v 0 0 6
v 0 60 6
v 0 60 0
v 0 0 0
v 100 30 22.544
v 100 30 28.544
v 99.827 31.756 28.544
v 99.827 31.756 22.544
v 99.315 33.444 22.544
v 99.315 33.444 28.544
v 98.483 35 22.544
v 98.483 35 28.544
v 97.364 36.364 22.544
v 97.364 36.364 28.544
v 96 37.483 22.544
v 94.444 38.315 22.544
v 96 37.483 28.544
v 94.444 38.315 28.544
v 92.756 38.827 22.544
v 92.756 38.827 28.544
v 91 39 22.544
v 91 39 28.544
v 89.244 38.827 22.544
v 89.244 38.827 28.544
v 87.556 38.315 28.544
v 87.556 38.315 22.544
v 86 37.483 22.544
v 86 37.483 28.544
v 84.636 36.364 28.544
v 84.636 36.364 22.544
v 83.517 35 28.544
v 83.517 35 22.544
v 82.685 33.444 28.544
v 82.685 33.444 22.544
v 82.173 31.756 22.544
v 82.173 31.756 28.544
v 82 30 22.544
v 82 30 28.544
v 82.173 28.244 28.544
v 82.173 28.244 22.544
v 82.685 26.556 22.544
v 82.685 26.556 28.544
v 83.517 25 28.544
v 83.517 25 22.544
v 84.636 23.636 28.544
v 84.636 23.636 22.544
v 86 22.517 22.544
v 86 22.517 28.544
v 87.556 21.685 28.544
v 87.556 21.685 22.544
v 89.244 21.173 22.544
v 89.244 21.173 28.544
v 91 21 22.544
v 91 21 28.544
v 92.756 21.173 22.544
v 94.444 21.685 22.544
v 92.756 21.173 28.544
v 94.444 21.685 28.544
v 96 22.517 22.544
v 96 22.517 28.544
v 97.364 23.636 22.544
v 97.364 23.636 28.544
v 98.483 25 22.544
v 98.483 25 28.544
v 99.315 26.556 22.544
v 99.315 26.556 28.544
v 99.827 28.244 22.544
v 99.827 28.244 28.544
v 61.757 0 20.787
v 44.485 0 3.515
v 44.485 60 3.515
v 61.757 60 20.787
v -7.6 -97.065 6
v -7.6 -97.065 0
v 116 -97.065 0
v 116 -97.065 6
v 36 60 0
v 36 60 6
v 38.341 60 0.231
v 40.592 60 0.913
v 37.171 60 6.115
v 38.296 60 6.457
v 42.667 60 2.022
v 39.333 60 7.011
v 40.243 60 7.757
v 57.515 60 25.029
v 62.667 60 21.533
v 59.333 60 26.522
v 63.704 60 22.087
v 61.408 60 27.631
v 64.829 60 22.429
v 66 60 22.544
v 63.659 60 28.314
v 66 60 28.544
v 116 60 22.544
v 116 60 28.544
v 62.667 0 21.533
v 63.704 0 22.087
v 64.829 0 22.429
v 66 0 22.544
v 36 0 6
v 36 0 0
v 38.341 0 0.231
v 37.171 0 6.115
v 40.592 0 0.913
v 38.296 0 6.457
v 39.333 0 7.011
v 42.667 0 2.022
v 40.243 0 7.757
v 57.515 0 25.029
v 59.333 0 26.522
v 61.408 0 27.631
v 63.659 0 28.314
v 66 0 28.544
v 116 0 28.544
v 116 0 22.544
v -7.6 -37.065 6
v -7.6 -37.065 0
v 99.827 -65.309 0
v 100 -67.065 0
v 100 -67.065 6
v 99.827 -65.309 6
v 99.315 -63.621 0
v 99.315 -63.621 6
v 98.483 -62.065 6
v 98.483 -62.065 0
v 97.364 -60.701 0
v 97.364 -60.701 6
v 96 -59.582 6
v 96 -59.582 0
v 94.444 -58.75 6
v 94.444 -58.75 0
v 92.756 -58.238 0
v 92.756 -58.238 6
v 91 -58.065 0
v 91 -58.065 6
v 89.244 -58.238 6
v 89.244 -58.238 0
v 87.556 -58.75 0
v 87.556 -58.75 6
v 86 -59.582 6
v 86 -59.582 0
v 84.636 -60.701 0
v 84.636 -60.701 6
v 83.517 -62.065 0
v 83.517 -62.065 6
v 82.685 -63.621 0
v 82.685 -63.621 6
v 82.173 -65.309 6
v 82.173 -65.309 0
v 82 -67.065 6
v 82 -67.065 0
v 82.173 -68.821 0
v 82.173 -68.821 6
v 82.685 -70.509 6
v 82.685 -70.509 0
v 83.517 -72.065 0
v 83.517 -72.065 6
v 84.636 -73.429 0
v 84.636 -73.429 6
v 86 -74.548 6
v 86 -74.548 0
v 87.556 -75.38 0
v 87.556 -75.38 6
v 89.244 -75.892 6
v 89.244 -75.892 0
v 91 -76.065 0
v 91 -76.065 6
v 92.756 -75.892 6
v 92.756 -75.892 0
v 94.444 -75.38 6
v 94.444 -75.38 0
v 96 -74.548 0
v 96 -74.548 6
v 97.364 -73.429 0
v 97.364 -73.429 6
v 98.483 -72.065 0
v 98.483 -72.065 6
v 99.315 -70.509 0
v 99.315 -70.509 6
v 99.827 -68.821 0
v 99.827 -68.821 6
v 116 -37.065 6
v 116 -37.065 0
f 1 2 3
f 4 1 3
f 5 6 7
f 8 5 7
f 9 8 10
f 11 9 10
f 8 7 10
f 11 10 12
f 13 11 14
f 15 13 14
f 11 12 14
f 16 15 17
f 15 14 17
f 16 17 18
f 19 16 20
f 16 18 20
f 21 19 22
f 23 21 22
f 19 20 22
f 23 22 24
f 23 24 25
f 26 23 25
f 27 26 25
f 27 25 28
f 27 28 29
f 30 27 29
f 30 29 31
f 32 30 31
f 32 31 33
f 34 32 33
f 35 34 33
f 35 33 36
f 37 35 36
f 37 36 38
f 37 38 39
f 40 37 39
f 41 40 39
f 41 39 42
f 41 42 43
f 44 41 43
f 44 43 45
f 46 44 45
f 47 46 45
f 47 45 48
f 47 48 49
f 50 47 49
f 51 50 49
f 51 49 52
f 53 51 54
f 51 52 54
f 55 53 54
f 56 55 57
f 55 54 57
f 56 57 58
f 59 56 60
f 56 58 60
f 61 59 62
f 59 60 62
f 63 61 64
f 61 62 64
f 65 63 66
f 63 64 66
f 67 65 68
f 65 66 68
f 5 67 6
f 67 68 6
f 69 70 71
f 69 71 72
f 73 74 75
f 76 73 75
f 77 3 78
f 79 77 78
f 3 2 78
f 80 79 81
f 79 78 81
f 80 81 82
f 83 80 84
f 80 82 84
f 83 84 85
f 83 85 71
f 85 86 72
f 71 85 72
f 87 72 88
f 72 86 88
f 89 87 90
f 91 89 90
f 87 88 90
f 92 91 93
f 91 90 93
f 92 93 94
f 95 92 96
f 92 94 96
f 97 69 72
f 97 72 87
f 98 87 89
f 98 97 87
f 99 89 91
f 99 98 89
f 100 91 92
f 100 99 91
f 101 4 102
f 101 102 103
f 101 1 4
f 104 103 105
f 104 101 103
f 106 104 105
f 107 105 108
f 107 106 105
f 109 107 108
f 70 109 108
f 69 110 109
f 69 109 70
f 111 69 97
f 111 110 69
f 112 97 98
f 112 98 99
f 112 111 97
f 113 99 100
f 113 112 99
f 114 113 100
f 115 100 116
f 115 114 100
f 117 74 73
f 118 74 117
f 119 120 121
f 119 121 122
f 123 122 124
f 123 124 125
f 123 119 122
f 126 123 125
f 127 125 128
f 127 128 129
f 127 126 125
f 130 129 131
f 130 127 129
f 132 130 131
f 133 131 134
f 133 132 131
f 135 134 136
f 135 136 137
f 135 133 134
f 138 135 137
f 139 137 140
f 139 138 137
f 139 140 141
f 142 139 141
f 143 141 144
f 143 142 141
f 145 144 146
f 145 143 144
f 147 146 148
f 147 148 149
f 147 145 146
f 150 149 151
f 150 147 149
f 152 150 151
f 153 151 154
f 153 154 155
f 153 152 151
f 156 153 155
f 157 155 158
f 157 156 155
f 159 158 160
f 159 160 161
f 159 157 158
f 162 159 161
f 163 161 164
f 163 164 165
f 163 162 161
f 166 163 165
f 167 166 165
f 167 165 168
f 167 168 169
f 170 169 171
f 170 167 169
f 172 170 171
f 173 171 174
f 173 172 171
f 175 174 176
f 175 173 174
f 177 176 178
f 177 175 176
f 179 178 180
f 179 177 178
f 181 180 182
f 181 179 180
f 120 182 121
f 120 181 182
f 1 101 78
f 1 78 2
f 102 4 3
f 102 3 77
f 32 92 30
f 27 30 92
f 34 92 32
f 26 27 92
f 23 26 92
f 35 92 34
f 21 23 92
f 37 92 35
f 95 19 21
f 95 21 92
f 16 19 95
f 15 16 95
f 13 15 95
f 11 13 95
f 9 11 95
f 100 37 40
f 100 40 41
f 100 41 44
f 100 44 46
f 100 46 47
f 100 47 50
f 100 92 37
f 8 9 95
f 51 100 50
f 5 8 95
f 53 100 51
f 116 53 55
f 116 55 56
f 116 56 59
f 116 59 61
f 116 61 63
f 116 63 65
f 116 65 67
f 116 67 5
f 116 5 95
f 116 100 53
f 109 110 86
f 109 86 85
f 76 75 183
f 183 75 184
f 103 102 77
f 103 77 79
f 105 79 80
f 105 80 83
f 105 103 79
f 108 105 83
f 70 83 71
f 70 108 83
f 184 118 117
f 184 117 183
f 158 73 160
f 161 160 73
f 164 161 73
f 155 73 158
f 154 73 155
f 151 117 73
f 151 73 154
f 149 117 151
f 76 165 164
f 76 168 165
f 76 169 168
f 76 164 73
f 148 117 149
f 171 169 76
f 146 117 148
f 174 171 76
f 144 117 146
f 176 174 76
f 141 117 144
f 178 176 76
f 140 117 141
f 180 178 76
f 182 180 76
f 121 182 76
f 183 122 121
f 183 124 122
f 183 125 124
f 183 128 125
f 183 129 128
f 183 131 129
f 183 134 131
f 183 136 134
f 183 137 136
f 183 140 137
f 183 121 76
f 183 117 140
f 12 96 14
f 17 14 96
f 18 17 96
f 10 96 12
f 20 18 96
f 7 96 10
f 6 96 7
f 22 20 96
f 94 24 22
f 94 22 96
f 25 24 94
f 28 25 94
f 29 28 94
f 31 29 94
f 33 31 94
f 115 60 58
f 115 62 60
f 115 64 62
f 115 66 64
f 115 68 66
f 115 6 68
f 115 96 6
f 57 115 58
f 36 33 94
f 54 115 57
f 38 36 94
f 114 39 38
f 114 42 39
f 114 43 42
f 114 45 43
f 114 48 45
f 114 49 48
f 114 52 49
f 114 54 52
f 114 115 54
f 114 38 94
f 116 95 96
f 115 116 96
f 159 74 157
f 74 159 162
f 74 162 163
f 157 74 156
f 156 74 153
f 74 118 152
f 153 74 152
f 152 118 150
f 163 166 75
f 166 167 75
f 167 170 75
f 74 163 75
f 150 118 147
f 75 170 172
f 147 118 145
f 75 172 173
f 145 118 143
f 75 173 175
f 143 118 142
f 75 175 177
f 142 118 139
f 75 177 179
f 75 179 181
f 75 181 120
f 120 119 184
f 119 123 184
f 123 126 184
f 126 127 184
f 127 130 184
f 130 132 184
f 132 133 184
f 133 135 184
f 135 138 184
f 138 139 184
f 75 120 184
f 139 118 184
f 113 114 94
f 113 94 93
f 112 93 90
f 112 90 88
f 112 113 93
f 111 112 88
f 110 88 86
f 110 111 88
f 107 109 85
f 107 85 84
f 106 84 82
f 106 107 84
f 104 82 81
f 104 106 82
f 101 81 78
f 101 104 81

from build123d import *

# Parameters (mm, degrees)
F1_DEPTH = 60
F2_R     = 9
F3_DEPTH = 25
F4_W     = 123.6
F4_H     = 60
F4_R     = 9
F5_DEPTH = 6


with BuildPart() as f1:
    # F0 (on Front) → F1 (new body)
    with BuildSketch(Plane.XZ):
        with BuildLine():
            Line((0, 0), (36, 0))
            ThreePointArc((36, 0), (40.592201, 0.913446), (44.485281, 3.514719))
            Line((44.485281, 3.514719), (61.757359, 20.786797))
            ThreePointArc((61.757359, 20.786797), (63.703899, 22.087433), (66, 22.544156))
            Line((66, 22.544156), (116, 22.544156))
            Line((116, 22.544156), (116, 28.544156))
            Line((116, 28.544156), (66, 28.544156))
            ThreePointArc((66, 28.544156), (61.407799, 27.63071), (57.514719, 25.029437))
            Line((57.514719, 25.029437), (40.242641, 7.757359))
            ThreePointArc((40.242641, 7.757359), (38.296101, 6.456723), (36, 6))
            Line((36, 6), (0, 6))
            Line((0, 6), (0, 0))
        make_face()
    extrude(amount=-F1_DEPTH)

    # F2 (on face) → F3 (cut)
    with BuildSketch(Plane.XY.offset(28.544156)):
        with Locations((91, 30)):
            Circle(F2_R)
    extrude(amount=-F3_DEPTH, mode=Mode.SUBTRACT)


with BuildPart() as f5:
    # F4 (on Top) → F5 (new body)
    with BuildSketch(Plane.XY):
        with Locations((54.2, -67.065209)):
            Rectangle(F4_W, F4_H)
        with Locations((91, -67.065209)):
            Circle(F4_R, mode=Mode.SUBTRACT)
    extrude(amount=F5_DEPTH)


solid = Compound([f1.part, f5.part])
